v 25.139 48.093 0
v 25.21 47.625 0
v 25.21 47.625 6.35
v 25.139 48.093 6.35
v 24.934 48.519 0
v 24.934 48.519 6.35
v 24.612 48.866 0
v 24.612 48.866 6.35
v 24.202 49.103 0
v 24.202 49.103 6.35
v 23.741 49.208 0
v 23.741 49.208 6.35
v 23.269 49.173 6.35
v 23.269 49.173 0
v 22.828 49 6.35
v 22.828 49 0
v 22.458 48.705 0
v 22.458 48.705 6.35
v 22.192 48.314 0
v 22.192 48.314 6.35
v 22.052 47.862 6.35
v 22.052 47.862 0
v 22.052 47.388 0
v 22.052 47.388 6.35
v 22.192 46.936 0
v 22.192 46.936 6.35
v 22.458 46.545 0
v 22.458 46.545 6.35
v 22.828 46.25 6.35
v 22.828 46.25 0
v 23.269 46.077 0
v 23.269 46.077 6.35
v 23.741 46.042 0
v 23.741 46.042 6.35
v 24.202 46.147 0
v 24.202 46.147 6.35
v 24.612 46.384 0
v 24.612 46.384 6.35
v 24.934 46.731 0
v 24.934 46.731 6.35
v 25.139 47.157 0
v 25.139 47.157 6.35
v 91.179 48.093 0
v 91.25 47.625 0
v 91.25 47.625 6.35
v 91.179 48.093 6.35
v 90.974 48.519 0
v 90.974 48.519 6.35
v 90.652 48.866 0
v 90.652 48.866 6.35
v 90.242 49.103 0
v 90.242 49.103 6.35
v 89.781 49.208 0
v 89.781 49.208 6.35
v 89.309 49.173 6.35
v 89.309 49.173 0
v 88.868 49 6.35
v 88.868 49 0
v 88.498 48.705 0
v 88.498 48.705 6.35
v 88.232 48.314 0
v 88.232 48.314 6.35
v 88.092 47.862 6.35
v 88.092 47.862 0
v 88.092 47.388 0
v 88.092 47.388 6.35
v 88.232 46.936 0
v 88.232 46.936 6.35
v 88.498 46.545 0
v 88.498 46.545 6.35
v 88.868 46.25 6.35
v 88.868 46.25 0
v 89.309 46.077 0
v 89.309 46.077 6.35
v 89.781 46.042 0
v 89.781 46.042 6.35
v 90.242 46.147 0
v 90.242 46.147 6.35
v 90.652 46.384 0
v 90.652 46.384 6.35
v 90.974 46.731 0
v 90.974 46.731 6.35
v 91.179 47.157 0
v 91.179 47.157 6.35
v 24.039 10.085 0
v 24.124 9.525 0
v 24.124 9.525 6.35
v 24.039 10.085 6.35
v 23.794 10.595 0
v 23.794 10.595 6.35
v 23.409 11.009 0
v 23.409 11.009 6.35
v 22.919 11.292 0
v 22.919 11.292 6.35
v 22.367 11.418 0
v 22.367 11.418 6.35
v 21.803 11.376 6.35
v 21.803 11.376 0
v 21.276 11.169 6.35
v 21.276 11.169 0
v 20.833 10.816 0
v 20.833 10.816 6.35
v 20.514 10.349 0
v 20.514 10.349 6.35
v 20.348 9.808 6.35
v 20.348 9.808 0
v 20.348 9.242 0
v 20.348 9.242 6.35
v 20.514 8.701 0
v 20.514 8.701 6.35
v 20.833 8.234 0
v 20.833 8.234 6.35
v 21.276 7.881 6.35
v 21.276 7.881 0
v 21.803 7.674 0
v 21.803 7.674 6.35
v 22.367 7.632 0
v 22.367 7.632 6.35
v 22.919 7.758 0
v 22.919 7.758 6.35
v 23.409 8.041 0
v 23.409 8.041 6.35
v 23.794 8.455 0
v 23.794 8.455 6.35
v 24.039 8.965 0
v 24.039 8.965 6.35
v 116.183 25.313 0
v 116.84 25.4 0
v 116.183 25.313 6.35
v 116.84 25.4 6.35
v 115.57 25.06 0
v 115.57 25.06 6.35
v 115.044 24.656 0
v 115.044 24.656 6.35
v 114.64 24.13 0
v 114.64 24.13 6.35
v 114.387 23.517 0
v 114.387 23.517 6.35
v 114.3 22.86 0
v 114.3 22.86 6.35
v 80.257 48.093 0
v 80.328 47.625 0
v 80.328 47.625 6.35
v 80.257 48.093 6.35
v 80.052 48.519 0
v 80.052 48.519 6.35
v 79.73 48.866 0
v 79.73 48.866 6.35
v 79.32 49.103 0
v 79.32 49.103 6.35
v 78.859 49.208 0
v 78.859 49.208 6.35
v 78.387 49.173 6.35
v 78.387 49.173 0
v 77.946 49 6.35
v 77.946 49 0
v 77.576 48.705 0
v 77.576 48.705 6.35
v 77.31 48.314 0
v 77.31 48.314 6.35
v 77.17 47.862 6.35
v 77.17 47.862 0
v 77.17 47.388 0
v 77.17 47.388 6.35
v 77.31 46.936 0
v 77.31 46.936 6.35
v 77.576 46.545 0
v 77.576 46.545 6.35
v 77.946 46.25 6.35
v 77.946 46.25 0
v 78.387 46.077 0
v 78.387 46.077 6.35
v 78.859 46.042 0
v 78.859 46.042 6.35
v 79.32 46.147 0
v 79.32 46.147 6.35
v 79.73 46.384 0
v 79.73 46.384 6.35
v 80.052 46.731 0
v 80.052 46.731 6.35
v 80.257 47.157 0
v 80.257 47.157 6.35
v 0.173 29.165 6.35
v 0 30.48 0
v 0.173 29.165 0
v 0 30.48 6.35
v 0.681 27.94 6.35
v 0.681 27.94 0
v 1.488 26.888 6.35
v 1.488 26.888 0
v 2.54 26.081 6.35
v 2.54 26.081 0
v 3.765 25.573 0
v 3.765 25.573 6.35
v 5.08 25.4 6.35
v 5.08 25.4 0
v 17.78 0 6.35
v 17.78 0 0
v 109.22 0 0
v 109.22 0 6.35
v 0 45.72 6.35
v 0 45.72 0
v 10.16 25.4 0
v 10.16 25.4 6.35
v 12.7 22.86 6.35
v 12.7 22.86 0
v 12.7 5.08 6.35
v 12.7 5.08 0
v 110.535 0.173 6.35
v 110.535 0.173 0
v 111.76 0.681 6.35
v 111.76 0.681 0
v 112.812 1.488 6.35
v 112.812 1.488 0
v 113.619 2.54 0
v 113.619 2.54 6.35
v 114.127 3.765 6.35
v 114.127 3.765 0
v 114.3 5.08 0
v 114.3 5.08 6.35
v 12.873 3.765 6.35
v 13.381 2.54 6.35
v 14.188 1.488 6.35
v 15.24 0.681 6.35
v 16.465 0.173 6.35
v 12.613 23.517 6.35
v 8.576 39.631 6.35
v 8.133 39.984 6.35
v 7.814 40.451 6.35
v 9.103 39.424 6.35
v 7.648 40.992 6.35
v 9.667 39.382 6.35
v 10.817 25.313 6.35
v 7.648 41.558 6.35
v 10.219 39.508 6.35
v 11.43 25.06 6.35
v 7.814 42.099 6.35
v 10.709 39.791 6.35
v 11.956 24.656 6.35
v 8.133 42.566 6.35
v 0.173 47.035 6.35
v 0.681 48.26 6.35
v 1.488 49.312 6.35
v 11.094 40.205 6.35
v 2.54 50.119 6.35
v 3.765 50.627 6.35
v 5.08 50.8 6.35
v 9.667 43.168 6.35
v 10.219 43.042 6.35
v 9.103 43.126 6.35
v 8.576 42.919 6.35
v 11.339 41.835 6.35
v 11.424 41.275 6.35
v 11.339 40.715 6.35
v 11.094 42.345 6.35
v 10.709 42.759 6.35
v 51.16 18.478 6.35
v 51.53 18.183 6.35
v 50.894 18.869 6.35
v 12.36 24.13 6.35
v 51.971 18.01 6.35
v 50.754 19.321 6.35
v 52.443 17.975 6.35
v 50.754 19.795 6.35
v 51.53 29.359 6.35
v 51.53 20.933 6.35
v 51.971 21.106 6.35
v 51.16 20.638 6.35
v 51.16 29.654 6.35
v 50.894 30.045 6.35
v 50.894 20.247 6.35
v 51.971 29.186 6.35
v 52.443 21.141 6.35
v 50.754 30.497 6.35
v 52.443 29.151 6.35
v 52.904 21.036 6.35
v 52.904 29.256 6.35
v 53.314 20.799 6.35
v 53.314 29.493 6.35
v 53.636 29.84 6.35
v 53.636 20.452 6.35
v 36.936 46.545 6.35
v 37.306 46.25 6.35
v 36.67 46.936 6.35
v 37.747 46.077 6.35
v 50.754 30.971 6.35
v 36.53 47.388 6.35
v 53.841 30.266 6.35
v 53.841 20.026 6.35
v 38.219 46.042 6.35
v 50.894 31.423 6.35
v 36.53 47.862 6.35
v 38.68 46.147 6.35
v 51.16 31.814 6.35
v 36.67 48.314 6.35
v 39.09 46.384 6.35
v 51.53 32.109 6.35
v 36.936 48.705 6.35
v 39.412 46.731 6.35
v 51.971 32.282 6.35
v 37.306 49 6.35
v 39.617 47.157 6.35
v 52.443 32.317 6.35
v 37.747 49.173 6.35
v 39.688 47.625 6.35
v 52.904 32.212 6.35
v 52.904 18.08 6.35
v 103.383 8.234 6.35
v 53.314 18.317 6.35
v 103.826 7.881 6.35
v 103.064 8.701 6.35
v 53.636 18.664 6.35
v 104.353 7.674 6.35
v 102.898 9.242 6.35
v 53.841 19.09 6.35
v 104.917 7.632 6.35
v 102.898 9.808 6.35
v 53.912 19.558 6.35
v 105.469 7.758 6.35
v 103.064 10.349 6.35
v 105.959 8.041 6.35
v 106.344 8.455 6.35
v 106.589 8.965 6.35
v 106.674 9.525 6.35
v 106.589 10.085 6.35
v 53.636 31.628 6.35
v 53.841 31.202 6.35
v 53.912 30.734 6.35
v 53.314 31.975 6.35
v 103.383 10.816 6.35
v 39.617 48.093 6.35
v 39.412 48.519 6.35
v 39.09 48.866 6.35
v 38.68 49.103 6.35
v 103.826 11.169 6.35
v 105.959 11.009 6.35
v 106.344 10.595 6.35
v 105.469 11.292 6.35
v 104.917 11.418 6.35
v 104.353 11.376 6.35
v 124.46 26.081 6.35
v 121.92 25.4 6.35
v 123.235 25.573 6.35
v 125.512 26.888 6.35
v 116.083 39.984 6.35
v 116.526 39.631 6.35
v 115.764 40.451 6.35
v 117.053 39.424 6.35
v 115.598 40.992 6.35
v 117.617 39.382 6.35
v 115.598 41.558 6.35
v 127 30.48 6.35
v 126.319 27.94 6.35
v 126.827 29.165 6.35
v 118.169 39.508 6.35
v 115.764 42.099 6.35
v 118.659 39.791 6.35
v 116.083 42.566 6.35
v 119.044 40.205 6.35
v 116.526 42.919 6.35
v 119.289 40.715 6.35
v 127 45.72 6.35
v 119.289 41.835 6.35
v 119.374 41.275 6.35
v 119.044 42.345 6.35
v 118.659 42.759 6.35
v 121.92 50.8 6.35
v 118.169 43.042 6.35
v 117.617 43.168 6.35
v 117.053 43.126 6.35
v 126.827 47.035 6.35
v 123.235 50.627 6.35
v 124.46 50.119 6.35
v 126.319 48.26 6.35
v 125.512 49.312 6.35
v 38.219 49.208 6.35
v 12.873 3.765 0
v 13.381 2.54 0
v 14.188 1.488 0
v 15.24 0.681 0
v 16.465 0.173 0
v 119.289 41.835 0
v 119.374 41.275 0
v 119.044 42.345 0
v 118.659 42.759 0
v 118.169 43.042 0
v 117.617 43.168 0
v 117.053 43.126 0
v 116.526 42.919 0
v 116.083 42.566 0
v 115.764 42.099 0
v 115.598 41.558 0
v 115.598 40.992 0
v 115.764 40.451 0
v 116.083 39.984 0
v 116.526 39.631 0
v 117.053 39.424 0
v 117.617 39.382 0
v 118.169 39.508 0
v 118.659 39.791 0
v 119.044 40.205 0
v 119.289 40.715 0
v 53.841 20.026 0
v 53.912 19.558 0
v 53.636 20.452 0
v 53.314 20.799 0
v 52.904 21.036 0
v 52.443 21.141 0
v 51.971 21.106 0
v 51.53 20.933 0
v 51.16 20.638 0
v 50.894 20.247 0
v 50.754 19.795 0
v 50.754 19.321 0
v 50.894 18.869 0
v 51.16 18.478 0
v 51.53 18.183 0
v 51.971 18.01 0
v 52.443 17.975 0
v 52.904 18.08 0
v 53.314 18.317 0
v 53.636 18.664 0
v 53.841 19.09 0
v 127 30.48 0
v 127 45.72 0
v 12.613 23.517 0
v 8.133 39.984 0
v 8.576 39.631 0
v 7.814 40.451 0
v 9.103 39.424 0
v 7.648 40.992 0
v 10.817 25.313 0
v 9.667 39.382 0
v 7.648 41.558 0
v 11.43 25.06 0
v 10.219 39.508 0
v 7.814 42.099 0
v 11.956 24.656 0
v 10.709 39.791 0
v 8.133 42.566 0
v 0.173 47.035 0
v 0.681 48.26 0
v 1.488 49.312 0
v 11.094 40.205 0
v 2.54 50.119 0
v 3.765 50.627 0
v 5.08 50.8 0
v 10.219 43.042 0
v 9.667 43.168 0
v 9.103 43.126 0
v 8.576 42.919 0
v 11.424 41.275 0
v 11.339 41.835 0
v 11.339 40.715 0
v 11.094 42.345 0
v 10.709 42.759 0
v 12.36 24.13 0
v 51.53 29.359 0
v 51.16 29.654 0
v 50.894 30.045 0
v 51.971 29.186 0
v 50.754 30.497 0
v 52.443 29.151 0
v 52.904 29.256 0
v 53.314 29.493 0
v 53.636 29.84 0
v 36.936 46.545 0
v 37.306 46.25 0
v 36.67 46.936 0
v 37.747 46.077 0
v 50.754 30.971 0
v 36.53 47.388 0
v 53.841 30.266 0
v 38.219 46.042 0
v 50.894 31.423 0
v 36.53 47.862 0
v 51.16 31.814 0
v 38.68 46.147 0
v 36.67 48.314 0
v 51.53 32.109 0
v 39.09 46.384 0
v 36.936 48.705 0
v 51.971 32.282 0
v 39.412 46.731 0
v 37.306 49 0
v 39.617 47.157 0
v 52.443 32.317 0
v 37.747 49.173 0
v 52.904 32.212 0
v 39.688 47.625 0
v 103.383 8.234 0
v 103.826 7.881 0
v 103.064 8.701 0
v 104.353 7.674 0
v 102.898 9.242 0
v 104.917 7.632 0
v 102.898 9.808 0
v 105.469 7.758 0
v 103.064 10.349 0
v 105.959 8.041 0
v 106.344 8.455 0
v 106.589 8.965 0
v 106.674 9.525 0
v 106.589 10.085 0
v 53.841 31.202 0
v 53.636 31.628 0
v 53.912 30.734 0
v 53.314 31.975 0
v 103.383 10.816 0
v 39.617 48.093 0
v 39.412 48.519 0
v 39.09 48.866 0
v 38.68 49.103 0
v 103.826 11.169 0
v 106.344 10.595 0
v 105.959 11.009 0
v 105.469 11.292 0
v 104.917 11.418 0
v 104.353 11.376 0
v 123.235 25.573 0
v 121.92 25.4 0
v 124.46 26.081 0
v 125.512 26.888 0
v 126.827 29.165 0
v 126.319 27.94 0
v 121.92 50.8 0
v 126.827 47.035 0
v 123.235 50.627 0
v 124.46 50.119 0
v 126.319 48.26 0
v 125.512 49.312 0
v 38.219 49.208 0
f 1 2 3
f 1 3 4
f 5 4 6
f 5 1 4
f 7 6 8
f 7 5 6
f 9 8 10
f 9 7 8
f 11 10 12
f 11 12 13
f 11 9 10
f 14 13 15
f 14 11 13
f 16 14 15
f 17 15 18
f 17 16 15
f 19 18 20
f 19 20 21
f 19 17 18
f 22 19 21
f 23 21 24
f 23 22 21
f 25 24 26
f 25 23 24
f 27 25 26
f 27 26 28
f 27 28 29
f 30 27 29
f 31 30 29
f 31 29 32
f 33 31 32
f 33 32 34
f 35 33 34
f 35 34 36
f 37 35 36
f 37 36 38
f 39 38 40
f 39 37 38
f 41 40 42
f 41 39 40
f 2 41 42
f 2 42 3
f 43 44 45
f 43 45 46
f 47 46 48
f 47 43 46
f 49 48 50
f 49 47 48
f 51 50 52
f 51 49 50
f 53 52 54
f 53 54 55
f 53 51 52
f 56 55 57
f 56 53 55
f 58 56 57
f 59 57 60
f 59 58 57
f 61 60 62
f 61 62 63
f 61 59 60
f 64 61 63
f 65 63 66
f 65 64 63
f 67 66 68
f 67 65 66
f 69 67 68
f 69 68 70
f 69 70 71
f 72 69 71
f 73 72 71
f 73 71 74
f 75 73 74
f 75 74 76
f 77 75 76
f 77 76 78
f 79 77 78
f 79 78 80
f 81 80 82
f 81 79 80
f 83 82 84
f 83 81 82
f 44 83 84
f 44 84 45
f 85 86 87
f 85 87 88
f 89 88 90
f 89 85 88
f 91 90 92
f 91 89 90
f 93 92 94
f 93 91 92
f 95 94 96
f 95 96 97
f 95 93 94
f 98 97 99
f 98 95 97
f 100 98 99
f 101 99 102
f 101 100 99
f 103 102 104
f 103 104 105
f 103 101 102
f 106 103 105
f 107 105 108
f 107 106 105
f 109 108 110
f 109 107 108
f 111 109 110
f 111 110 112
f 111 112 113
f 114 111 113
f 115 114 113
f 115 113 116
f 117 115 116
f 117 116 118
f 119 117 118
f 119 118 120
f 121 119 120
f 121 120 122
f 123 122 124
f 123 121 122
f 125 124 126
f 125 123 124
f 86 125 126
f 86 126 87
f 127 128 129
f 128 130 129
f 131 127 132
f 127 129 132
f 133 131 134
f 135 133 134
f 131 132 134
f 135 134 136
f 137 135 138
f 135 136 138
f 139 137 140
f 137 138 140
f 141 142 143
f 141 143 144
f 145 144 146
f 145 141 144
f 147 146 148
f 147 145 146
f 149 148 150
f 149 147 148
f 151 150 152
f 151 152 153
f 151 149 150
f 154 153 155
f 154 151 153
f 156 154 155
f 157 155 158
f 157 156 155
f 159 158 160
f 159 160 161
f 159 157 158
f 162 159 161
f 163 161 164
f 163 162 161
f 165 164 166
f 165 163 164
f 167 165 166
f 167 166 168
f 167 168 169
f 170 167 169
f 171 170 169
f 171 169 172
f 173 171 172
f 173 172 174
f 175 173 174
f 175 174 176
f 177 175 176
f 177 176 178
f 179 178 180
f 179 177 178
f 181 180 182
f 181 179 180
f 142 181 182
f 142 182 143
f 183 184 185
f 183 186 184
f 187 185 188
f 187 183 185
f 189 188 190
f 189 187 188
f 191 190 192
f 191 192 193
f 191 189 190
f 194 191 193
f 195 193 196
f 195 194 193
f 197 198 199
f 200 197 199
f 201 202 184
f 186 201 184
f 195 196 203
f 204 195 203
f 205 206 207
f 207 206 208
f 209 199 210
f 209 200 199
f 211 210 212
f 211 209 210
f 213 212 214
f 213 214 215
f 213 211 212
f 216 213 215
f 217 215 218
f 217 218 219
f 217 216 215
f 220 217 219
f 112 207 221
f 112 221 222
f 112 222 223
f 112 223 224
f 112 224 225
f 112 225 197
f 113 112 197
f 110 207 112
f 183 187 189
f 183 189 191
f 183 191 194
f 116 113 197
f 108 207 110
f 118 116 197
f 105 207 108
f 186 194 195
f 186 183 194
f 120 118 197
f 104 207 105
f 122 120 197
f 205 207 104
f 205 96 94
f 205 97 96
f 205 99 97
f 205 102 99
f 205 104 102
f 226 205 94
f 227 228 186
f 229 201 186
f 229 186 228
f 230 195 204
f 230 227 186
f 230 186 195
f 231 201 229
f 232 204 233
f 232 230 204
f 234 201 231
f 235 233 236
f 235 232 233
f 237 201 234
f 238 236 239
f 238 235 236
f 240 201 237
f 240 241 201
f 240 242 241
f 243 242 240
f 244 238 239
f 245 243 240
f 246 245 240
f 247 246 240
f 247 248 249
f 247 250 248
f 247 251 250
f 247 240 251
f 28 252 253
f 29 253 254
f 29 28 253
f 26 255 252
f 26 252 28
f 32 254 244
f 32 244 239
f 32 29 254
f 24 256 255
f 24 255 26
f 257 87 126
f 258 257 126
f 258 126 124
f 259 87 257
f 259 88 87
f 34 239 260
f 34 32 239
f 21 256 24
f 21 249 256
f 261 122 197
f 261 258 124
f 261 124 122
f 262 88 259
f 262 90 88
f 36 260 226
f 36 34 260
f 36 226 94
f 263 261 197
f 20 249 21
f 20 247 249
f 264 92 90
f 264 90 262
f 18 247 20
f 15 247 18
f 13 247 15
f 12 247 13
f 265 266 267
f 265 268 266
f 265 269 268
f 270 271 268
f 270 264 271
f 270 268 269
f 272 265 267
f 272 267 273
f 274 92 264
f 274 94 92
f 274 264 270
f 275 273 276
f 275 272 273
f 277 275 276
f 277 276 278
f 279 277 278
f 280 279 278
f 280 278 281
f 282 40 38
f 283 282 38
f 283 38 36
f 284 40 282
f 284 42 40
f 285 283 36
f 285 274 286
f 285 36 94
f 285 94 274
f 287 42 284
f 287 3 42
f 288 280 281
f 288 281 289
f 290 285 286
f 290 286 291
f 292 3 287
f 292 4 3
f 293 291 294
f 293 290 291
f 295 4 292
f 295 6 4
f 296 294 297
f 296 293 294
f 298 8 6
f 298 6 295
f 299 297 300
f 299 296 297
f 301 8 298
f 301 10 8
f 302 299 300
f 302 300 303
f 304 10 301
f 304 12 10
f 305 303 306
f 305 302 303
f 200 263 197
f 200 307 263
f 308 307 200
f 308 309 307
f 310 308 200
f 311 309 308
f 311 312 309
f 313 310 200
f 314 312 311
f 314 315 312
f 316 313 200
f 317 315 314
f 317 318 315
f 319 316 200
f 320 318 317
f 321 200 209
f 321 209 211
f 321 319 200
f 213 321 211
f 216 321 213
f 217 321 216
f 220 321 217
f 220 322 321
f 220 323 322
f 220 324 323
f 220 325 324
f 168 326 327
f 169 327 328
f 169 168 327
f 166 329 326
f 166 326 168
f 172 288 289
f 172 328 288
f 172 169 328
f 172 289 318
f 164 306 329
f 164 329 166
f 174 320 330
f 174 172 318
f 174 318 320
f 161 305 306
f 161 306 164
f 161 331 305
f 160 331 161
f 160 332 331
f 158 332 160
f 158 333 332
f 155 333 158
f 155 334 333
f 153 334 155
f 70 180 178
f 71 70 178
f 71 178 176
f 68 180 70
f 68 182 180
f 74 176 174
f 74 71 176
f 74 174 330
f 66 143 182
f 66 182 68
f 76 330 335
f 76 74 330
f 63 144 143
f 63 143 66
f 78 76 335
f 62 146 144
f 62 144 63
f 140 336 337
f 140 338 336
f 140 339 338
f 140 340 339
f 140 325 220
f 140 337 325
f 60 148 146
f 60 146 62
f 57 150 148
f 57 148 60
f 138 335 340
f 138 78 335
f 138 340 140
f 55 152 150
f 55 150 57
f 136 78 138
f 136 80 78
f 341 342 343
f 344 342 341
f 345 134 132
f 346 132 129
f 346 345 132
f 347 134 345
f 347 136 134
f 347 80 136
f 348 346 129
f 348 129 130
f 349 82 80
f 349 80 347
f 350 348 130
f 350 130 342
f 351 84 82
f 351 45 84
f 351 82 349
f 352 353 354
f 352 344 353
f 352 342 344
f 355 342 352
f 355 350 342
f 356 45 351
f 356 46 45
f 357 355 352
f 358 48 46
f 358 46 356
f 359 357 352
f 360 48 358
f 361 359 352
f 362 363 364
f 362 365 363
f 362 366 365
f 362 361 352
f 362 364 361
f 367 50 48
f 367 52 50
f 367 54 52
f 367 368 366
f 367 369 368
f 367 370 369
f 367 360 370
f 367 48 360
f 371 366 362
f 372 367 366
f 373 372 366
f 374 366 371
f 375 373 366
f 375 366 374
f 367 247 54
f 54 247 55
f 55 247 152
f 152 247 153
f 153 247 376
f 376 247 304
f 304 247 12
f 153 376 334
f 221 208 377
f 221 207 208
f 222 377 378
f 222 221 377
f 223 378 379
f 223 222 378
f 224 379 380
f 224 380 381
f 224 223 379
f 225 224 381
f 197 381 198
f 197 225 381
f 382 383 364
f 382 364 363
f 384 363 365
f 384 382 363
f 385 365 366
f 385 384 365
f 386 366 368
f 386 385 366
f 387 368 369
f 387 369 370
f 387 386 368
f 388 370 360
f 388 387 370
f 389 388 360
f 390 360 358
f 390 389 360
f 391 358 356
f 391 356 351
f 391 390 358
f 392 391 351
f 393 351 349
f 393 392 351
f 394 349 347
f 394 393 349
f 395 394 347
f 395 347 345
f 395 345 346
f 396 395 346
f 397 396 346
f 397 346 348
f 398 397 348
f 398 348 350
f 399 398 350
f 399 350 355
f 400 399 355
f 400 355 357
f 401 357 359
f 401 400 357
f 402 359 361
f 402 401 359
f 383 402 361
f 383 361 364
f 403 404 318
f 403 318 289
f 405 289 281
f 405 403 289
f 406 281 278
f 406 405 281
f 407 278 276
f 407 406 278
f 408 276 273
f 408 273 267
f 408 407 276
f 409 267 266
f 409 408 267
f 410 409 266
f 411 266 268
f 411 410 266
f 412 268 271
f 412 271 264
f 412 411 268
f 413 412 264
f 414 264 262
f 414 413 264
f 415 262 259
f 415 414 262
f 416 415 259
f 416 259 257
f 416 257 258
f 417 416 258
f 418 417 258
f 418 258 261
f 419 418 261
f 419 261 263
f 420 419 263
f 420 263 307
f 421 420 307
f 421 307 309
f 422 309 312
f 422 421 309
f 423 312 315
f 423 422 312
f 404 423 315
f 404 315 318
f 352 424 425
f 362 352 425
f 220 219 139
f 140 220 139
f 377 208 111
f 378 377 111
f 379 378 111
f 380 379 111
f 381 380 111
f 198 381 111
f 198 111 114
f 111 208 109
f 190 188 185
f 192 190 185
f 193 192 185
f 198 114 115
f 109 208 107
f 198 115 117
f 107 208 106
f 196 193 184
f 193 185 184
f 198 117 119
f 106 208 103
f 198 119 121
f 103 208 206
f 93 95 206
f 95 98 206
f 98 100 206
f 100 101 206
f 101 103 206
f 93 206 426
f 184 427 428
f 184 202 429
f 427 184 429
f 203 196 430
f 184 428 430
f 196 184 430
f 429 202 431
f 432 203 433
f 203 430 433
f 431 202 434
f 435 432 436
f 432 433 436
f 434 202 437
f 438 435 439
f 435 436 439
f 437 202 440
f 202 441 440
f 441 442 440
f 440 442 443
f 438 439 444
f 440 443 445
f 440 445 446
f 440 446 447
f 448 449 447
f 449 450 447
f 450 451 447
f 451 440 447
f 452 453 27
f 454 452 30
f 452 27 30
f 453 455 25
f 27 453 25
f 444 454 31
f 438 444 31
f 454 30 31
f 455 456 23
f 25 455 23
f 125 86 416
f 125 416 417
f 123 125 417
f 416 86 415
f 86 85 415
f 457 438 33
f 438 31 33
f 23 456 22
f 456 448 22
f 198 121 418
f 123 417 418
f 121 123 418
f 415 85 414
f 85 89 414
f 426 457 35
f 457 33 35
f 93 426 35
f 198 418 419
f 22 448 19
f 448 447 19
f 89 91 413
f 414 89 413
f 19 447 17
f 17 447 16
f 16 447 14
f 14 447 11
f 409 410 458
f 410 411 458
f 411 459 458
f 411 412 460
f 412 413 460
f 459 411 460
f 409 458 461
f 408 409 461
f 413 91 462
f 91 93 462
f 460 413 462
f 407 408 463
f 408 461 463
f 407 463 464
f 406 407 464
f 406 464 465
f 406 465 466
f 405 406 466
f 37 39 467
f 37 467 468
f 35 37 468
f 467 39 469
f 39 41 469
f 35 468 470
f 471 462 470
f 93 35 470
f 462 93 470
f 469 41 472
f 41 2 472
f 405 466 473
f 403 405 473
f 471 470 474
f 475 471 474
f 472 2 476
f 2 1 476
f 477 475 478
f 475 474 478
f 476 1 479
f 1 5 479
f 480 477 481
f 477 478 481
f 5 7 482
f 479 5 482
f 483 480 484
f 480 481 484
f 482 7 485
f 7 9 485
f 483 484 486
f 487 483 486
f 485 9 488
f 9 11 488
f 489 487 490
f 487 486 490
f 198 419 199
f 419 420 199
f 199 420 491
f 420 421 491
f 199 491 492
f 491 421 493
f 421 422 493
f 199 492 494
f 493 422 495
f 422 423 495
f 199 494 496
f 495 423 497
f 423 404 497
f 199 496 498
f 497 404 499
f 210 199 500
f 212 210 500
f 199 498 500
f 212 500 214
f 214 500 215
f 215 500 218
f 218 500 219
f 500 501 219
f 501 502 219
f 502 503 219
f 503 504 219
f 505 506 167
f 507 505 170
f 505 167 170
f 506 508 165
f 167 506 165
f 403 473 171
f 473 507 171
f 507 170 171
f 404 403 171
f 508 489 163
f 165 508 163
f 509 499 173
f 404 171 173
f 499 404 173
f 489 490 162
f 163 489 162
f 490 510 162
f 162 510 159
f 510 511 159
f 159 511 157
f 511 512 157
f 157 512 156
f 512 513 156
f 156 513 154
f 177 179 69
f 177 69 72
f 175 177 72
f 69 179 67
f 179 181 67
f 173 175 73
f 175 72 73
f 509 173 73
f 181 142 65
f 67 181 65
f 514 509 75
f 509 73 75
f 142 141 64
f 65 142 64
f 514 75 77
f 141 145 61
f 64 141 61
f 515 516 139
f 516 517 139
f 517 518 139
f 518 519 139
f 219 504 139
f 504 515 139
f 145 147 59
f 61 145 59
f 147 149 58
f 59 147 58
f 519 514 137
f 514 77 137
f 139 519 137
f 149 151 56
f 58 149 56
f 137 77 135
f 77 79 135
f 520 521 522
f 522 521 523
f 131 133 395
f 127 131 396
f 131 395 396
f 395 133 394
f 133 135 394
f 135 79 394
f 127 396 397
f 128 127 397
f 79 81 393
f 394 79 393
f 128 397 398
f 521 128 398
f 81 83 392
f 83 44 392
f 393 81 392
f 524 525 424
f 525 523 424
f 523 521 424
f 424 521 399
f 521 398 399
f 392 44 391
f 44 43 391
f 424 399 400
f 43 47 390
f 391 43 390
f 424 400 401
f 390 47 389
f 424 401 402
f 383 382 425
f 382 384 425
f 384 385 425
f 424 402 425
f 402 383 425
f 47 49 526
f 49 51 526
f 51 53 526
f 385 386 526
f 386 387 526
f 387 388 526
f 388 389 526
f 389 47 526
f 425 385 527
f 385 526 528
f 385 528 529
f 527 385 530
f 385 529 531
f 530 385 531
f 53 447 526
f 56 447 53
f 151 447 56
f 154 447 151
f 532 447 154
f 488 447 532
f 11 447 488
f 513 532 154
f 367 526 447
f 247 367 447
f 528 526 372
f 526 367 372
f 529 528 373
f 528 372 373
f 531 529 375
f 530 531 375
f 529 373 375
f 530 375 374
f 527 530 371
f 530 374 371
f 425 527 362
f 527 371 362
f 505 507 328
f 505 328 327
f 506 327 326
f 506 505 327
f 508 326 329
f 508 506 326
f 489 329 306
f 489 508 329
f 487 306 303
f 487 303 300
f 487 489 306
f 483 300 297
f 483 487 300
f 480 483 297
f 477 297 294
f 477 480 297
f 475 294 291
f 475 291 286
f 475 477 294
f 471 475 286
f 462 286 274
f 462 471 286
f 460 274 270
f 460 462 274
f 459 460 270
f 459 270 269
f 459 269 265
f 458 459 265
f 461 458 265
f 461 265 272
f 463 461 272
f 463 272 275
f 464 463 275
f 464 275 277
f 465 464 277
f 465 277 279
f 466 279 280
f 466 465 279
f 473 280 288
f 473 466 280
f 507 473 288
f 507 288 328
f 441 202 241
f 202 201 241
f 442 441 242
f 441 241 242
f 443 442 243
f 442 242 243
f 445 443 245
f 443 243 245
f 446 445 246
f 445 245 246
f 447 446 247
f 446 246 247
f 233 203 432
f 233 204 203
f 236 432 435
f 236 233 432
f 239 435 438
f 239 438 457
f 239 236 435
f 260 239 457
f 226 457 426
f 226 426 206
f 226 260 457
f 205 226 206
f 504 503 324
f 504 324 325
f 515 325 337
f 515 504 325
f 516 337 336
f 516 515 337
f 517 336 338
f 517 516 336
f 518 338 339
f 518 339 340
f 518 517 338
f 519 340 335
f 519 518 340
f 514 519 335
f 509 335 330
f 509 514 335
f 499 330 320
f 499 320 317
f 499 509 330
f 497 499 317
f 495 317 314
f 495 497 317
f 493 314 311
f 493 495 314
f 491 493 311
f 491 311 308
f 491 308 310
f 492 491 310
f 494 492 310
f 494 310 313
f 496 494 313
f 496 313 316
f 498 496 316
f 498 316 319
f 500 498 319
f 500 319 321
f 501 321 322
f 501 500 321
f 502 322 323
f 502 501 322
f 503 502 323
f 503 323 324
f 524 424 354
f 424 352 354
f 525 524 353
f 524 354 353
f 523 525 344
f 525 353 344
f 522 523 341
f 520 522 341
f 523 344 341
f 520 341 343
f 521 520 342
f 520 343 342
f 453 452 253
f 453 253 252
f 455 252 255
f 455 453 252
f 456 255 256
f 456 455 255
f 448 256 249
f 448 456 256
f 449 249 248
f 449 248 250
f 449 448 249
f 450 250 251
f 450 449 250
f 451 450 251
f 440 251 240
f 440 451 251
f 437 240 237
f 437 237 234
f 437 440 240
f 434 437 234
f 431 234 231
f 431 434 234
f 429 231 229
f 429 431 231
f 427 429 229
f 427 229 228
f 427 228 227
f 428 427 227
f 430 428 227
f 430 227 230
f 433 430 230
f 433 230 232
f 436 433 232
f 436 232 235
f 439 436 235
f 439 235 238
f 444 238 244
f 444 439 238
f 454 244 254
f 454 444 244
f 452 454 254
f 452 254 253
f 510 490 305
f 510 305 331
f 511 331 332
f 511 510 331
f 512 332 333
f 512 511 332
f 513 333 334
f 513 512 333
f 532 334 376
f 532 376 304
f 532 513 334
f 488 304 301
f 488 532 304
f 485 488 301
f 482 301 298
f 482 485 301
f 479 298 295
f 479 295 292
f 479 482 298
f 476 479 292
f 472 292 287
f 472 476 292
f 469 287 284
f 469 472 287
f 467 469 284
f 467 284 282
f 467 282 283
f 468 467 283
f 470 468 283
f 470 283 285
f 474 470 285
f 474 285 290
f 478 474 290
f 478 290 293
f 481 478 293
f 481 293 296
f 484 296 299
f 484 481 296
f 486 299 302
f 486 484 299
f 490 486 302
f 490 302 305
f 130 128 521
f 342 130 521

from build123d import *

# Parameters (mm, degrees)
SKETCH1_R           = 1.89865
SKETCH1_R_2         = 1.5875
BOSS_EXTRUDE1_DEPTH = 6.35
FILLET1_R           = 5.08
FILLET2_R           = 2.54


with BuildPart() as part:
    # Sketch1 → Boss-Extrude1 (new body)
    with BuildSketch(Plane.XY):
        Polygon((0, 50.8), (0, 25.4), (12.7, 25.4), (12.7, 0), (114.3, 0), (114.3, 25.4), (127, 25.4), (127, 50.8), align=None)
        with Locations((22.225, 9.525)):
            Circle(SKETCH1_R, mode=Mode.SUBTRACT)
        with Locations((52.324, 19.558)):
            Circle(SKETCH1_R_2, mode=Mode.SUBTRACT)
        with Locations((104.775, 9.525)):
            Circle(SKETCH1_R, mode=Mode.SUBTRACT)
        with Locations((52.324, 30.734)):
            Circle(SKETCH1_R_2, mode=Mode.SUBTRACT)
        with Locations((9.525, 41.275)):
            Circle(SKETCH1_R, mode=Mode.SUBTRACT)
        with Locations((23.622, 47.625)):
            Circle(SKETCH1_R_2, mode=Mode.SUBTRACT)
        with Locations((38.1, 47.625)):
            Circle(SKETCH1_R_2, mode=Mode.SUBTRACT)
        with Locations((78.74, 47.625)):
            Circle(SKETCH1_R_2, mode=Mode.SUBTRACT)
        with Locations((89.662, 47.625)):
            Circle(SKETCH1_R_2, mode=Mode.SUBTRACT)
        with Locations((117.475, 41.275)):
            Circle(SKETCH1_R, mode=Mode.SUBTRACT)
    extrude(amount=BOSS_EXTRUDE1_DEPTH)

    # Fillet1
    fillet1_edges = [part.edges().sort_by_distance(p)[0] for p in [
        (114.3, 0, 3.175),
        (12.7, 0, 3.175),
        (0, 25.4, 3.175),
        (0, 50.8, 3.175),
        (127, 50.8, 3.175),
        (127, 25.4, 3.175),
    ]]
    fillet(fillet1_edges, radius=FILLET1_R)

    # Fillet2
    fillet2_edges = [part.edges().sort_by_distance(p)[0] for p in [
        (12.7, 25.4, 3.175),
        (114.3, 25.4, 3.175),
    ]]
    fillet(fillet2_edges, radius=FILLET2_R)


solid = part.part
